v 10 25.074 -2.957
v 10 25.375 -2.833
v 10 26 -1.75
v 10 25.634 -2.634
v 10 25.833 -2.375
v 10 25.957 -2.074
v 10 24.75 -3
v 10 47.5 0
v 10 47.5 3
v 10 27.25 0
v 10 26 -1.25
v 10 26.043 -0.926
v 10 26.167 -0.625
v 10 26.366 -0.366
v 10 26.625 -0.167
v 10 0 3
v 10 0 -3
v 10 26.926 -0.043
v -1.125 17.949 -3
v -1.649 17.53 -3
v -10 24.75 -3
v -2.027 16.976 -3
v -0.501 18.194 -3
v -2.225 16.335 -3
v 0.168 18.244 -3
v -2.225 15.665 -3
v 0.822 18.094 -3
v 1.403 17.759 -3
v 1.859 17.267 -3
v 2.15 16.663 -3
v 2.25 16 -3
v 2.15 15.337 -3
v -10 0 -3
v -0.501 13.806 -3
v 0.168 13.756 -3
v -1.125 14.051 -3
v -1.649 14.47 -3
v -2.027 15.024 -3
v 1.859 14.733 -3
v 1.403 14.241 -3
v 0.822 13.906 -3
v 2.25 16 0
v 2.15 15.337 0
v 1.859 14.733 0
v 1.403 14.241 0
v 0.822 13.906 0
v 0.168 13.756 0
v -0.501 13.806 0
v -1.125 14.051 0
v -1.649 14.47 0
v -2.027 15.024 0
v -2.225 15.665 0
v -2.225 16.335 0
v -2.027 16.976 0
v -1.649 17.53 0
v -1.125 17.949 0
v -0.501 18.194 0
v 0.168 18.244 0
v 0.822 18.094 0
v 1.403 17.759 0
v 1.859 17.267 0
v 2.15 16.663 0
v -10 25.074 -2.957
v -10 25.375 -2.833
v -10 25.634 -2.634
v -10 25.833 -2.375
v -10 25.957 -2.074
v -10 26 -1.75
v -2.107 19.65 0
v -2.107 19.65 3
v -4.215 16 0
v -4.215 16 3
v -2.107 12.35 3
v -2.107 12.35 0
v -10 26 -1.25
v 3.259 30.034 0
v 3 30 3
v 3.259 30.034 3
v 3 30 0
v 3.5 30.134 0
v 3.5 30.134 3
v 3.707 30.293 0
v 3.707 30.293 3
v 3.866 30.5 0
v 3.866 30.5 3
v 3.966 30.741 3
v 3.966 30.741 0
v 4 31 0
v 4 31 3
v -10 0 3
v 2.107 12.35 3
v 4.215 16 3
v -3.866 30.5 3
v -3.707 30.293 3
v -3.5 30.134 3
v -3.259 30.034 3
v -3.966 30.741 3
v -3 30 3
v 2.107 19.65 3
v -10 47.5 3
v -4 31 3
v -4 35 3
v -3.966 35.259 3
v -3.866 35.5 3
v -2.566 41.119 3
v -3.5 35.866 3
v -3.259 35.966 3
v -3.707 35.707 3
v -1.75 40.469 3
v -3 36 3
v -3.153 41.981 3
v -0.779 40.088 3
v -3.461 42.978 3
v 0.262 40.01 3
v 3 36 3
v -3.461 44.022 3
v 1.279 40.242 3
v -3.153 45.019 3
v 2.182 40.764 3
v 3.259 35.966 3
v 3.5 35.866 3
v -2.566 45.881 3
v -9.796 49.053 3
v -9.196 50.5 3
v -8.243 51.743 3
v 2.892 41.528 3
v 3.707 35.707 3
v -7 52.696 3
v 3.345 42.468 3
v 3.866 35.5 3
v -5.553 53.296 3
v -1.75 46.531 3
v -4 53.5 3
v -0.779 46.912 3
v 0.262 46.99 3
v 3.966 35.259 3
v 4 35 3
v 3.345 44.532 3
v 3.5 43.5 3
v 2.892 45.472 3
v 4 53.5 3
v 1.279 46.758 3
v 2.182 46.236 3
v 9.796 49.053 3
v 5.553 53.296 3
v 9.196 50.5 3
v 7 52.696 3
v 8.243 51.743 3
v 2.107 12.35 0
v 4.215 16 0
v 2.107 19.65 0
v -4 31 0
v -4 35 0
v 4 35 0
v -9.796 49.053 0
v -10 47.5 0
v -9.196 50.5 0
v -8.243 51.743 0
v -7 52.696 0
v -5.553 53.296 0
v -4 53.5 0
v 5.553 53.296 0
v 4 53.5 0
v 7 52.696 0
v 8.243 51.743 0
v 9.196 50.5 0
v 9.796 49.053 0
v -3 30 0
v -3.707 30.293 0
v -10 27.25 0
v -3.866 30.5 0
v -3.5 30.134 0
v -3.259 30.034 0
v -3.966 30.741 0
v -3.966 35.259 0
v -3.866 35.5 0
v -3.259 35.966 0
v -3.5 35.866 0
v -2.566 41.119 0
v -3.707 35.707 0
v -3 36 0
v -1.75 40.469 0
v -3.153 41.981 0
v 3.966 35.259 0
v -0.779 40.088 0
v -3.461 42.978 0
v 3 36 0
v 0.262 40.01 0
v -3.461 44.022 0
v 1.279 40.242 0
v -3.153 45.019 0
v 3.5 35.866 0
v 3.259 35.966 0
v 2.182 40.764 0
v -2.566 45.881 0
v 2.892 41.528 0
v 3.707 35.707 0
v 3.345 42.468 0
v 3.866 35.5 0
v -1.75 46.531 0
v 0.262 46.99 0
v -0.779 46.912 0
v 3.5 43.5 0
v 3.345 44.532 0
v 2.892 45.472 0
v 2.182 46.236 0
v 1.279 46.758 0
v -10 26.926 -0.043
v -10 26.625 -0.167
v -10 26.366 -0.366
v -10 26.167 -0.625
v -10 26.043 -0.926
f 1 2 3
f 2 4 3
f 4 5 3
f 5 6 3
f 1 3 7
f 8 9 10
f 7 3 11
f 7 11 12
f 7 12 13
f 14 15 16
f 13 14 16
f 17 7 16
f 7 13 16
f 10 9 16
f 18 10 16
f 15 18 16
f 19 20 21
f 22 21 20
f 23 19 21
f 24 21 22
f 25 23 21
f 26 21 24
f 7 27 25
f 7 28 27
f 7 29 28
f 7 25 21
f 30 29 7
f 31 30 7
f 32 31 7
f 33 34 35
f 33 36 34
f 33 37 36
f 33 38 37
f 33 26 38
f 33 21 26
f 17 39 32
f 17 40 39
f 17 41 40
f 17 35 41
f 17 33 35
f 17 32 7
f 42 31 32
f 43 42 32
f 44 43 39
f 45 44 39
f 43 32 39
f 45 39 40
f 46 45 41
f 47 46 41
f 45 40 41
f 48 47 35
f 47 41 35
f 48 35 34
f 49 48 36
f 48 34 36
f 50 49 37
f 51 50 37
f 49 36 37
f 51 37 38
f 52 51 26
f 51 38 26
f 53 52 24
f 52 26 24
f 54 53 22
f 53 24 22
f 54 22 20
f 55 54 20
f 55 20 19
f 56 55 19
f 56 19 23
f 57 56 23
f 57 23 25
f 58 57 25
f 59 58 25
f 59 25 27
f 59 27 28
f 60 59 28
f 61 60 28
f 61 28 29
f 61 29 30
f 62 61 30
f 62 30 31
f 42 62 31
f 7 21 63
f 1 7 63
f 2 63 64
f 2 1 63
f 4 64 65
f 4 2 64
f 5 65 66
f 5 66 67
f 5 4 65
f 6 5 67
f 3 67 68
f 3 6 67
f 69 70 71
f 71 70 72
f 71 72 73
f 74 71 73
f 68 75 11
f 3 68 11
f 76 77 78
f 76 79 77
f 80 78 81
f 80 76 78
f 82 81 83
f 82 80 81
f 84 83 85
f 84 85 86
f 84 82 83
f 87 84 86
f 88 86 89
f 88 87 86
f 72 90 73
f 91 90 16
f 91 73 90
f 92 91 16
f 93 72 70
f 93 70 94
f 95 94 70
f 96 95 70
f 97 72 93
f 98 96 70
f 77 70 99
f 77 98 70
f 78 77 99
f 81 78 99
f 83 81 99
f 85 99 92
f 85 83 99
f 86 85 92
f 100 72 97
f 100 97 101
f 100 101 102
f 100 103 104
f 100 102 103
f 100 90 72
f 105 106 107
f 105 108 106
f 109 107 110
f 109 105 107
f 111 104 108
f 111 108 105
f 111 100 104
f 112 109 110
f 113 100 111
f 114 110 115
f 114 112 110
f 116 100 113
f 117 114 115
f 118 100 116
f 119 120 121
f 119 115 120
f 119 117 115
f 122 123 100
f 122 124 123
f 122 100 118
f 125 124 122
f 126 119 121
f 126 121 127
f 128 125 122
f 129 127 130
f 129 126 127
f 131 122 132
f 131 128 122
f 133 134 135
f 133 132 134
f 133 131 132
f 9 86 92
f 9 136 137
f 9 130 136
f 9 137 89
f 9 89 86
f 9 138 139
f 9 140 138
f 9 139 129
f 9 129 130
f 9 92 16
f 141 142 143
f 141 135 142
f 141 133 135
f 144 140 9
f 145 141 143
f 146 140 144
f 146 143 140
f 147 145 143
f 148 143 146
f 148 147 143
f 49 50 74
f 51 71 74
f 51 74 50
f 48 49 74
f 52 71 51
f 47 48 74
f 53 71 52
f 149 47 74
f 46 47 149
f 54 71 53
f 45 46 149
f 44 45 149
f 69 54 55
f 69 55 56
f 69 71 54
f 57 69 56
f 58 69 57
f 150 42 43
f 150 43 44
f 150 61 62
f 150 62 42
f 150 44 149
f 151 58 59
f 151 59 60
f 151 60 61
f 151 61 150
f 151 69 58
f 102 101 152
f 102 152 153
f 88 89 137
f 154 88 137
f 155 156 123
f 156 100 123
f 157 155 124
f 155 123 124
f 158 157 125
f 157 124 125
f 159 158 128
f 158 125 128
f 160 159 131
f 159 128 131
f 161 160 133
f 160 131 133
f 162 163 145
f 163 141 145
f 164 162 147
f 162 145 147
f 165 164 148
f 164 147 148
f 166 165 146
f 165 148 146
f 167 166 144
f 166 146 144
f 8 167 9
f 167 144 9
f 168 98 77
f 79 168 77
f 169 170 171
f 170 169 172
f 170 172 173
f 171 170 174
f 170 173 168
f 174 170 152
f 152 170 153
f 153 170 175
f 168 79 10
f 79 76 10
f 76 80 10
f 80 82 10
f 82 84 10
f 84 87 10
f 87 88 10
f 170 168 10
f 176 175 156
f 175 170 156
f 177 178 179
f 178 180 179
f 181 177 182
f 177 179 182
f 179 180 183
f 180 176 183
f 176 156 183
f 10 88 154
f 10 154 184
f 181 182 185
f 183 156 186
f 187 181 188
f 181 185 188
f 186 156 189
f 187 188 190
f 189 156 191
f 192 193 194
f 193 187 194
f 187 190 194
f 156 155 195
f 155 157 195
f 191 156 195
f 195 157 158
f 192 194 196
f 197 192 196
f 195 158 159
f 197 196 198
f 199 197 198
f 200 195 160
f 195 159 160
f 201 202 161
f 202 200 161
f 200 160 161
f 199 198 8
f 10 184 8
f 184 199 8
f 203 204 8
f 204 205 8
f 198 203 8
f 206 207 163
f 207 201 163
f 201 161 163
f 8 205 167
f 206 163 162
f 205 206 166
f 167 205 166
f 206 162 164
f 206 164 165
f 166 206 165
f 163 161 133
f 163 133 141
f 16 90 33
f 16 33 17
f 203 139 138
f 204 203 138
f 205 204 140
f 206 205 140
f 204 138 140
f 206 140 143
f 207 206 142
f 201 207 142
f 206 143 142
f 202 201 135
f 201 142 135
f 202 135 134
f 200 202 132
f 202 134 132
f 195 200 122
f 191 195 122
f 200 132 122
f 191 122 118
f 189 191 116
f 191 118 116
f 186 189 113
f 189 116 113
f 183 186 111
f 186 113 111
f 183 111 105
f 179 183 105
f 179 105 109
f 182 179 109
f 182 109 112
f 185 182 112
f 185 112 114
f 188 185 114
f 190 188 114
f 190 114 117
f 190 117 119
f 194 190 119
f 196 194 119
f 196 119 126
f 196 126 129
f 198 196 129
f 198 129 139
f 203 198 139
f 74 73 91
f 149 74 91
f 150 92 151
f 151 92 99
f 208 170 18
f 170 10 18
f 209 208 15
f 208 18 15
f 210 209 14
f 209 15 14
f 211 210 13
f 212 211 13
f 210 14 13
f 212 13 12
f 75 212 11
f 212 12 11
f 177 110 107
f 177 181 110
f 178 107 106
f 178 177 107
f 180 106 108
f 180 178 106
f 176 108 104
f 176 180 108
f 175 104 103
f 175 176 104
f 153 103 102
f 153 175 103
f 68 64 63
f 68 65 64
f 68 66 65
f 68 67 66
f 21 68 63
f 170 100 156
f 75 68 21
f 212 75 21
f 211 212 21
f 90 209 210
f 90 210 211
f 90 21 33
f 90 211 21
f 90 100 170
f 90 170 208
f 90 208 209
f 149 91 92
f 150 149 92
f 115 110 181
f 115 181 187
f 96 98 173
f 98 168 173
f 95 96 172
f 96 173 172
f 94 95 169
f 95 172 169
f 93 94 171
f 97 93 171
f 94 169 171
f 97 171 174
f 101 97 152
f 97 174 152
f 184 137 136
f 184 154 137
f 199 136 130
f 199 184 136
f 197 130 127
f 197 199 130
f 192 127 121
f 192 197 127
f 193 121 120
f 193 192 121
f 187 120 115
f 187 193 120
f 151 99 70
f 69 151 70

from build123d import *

# Parameters (mm, degrees)
SKETCH_W        = 20
SKETCH_H        = 53.5
PAD_DEPTH       = 3
SKETCH001_W     = 20
SKETCH001_H     = 26
PAD001_DEPTH    = 3
FILLET_R        = 1.25
FILLET001_R     = 6
SKETCH002_R     = 2.25
POCKET_DEPTH    = 6
SKETCH003_R     = 3.5
SKETCH003_W     = 8
SKETCH003_H     = 6
POCKET001_DEPTH = 6
FILLET002_R     = 1
POCKET002_DEPTH = 3


with BuildPart() as part:
    # Sketch → Pad (new body)
    with BuildSketch(Plane.XY):
        with Locations((0, 26.75)):
            Rectangle(SKETCH_W, SKETCH_H)
    extrude(amount=PAD_DEPTH)

    # Sketch001 (on Face5 of Pad) → Pad001 (join)
    with BuildSketch(Plane(origin=(0, 0, 0), x_dir=(1, 0, 0), z_dir=(0, 0, -1))):
        with Locations((0, -13)):
            Rectangle(SKETCH001_W, SKETCH001_H)
    extrude(amount=PAD001_DEPTH)

    # Fillet
    fillet_edges = [part.edges().sort_by_distance(p)[0] for p in [
        (0, 26, 0),
        (0, 26, -3),
    ]]
    fillet(fillet_edges, radius=FILLET_R)

    # Fillet001
    fillet001_edges = [part.edges().sort_by_distance(p)[0] for p in [
        (10, 53.5, 1.5),
        (-10, 53.5, 1.5),
    ]]
    fillet(fillet001_edges, radius=FILLET001_R)

    # Sketch002 (on Face12 of Fillet001) → Pocket (cut)
    with BuildSketch(Plane(origin=(0, 0, -3), x_dir=(1, 0, 0), z_dir=(0, 0, -1))):
        with Locations((0, -16)):
            Circle(SKETCH002_R)
    extrude(amount=-POCKET_DEPTH, mode=Mode.SUBTRACT)

    # Sketch003 (on Face8 of Pocket) → Pocket001 (cut)
    with BuildSketch(Plane.XY.offset(3)):
        with Locations((0, 43.5)):
            Circle(SKETCH003_R)
        with Locations((0, 33)):
            Rectangle(SKETCH003_W, SKETCH003_H)
    extrude(amount=-POCKET001_DEPTH, mode=Mode.SUBTRACT)

    # Fillet002
    fillet002_edges = [part.edges().sort_by_distance(p)[0] for p in [
        (-4, 36, 1.5),
        (4, 36, 1.5),
        (4, 30, 1.5),
        (-4, 30, 1.5),
    ]]
    fillet(fillet002_edges, radius=FILLET002_R)

    # Sketch004 (on Face17 of Fillet002) → Pocket002 (cut)
    with BuildSketch(Plane.XY.offset(3)):
        Polygon((2.107328, 19.65), (-2.107328, 19.65), (-4.214657, 16), (-2.107328, 12.35), (2.107328, 12.35), (4.214657, 16), align=None)
    extrude(amount=-POCKET002_DEPTH, mode=Mode.SUBTRACT)


solid = part.part
